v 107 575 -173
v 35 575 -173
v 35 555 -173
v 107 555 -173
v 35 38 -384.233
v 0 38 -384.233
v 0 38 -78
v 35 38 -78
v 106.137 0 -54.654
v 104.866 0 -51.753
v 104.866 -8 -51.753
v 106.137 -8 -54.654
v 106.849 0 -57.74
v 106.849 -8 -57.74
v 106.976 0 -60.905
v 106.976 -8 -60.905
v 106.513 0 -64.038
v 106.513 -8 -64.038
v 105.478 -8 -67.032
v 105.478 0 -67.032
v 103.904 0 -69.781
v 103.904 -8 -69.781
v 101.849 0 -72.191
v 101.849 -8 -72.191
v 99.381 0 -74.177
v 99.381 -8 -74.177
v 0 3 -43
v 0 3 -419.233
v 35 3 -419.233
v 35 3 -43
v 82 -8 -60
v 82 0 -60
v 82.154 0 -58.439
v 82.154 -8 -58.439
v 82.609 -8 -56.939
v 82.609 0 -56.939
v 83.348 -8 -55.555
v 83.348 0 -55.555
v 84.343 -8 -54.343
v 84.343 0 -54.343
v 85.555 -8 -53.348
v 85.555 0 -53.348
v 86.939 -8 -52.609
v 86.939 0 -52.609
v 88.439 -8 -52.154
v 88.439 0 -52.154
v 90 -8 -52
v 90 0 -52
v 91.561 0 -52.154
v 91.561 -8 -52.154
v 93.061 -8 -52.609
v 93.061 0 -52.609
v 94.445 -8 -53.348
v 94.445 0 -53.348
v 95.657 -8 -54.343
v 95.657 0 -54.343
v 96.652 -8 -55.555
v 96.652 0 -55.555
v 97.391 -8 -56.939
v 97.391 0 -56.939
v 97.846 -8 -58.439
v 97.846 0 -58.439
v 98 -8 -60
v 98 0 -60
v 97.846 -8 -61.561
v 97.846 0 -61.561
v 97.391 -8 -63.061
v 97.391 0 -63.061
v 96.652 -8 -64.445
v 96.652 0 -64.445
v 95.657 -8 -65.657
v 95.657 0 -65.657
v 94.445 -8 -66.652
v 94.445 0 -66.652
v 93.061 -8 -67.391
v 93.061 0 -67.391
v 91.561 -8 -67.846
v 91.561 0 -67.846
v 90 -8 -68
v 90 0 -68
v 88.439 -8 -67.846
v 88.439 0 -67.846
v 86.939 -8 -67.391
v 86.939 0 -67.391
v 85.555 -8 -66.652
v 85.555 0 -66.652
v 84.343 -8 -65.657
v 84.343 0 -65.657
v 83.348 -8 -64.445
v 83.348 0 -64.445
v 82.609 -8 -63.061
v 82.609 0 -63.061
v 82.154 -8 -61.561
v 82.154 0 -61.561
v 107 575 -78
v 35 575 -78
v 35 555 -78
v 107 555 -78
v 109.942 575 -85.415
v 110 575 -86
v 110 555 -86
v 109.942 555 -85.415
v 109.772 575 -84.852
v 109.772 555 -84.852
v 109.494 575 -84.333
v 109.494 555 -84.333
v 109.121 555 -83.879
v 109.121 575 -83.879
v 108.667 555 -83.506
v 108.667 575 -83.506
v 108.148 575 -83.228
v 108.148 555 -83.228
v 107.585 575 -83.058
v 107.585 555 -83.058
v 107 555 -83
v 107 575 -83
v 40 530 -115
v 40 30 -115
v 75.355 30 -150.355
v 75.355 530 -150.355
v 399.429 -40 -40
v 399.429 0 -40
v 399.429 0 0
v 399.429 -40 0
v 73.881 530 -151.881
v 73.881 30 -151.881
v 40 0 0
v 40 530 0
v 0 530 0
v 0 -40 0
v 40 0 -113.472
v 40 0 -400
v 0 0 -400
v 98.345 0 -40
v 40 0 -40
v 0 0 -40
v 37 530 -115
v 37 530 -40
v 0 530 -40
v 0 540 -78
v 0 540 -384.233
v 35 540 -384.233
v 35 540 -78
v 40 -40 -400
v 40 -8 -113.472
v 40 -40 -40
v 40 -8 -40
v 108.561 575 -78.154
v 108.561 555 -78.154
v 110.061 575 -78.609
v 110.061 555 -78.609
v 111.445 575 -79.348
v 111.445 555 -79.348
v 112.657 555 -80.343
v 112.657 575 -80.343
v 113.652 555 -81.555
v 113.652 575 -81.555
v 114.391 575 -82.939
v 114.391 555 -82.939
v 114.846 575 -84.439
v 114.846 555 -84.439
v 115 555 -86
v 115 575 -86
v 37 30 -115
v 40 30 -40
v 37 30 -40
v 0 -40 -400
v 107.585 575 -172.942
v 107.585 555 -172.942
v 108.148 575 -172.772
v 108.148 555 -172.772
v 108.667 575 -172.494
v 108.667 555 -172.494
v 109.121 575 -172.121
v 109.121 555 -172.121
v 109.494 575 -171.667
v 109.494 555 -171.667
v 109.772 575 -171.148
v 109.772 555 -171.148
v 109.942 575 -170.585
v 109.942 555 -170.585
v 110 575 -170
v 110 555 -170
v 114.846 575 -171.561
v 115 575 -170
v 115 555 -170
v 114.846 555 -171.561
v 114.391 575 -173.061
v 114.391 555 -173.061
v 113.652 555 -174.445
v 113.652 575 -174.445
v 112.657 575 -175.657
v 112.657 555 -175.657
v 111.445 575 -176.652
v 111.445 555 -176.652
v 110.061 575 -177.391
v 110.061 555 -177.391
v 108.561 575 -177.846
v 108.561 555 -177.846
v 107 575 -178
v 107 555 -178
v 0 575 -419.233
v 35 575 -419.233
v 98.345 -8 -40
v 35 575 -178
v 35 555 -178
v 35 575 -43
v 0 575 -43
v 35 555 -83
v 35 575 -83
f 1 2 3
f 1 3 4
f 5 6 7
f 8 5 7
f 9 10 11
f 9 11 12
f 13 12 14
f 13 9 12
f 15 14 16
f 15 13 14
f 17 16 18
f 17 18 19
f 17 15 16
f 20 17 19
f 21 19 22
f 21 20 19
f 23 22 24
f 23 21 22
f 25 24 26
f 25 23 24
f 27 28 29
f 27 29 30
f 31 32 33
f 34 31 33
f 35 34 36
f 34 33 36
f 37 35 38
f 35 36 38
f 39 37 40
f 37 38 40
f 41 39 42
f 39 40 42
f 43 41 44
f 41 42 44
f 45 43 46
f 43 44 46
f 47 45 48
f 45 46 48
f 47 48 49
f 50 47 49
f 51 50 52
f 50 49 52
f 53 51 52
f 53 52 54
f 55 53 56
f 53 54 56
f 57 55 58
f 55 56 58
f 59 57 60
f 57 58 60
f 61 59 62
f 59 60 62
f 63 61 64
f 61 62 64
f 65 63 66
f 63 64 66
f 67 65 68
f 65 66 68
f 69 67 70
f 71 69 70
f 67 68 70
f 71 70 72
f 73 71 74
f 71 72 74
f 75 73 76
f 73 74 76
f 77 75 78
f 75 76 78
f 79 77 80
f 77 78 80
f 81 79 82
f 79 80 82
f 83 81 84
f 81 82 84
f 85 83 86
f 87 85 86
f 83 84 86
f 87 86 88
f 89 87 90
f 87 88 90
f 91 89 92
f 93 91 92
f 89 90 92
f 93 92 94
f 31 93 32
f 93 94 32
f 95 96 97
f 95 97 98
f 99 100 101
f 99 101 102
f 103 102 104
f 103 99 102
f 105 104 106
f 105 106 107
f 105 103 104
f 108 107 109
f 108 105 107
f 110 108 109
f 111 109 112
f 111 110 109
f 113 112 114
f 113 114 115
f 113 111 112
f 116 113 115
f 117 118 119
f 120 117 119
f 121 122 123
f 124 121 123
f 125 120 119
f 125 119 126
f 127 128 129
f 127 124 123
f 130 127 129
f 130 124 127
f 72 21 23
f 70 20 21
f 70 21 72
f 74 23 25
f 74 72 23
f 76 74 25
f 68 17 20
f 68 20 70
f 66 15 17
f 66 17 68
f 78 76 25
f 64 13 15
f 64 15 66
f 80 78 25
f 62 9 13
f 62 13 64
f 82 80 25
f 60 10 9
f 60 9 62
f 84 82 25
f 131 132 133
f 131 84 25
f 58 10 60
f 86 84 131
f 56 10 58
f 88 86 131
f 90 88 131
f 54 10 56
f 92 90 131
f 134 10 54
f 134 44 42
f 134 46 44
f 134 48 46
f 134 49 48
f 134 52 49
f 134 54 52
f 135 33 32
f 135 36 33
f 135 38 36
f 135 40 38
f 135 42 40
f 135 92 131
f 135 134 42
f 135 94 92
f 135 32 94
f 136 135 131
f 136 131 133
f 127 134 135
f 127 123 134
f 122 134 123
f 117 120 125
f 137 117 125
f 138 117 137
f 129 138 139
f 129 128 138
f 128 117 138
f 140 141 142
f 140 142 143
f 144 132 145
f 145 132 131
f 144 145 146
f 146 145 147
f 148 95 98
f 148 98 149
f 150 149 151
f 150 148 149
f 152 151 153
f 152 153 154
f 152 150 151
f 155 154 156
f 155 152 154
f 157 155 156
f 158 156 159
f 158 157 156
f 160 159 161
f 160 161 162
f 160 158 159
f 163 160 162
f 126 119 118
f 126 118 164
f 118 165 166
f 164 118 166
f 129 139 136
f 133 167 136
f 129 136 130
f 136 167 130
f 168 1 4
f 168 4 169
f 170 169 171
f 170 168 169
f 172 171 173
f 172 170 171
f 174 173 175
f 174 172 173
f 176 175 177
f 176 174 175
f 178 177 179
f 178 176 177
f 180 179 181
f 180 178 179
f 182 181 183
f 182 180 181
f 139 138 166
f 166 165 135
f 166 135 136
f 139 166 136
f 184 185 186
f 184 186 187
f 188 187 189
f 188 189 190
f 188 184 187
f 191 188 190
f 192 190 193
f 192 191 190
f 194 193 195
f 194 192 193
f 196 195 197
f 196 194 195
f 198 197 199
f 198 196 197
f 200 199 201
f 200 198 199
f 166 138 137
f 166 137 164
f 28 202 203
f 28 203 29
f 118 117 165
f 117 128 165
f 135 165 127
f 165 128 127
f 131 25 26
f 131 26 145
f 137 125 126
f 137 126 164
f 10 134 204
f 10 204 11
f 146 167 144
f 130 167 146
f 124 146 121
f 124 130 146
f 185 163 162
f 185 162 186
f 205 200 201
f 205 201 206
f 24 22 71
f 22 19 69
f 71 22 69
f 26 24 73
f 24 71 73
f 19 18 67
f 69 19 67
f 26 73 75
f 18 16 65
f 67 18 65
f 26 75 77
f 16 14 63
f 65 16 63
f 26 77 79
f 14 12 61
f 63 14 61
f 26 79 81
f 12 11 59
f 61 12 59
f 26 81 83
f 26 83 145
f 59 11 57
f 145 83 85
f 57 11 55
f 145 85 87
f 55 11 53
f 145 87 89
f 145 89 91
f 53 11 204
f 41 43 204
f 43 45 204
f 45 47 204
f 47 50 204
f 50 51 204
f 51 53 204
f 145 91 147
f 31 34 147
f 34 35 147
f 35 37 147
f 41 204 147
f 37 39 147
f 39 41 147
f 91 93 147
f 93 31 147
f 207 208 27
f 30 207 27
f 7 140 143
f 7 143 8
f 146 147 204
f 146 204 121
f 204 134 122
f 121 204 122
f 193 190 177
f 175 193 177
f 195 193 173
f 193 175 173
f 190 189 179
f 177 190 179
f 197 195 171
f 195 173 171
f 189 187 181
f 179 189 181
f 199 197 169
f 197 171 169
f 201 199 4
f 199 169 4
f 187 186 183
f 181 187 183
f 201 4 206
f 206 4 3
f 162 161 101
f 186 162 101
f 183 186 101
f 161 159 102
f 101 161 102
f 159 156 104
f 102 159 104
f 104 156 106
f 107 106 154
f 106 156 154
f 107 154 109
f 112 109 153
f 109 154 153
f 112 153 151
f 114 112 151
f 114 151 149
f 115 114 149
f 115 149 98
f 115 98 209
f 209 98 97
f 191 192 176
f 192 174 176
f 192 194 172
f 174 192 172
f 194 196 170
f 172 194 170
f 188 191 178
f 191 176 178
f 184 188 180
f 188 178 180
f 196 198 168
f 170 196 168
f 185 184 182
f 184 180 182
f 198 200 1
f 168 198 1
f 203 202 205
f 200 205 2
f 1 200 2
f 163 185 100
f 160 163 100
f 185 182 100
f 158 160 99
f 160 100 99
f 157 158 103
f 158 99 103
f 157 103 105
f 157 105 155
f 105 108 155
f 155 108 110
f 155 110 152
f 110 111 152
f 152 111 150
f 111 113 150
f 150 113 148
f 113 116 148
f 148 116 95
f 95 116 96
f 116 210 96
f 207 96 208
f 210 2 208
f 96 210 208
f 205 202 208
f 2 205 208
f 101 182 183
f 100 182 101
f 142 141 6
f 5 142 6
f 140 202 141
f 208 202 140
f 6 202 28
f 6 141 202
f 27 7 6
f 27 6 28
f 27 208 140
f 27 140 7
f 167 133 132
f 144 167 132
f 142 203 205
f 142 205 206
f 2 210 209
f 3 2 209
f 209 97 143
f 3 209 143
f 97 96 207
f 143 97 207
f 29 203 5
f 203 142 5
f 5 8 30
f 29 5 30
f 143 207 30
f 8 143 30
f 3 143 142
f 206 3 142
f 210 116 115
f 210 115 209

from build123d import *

# Parameters (mm, degrees)
F1_DEPTH  = 40
F2_W      = 40
F2_H      = 40
F3_DEPTH  = 530
F4_R      = 8
F5_DEPTH  = 8
F6_W      = 3
F6_H      = 500
F7_DEPTH  = 75
F9_DEPTH  = 500
F10_W     = 572
F10_H     = 376.232696
F10_W_2   = 502
F10_H_2   = 306.232696
F11_DEPTH = 35
F13_DEPTH = 20


with BuildPart() as f1:
    # F0 (on Front) → F1 (new body)
    with BuildSketch(Plane.XZ):
        Polygon((0, 0), (0, -400), (40, -400), (40, -40), (399.429325, -40), (399.429325, 0), align=None)
    extrude(amount=F1_DEPTH)

    # F2 (on face) → F3 (join)
    with BuildSketch(Plane(origin=(0, 0, 0), x_dir=(-1, 0, 0), z_dir=(0, 1, 0))):
        with Locations((-20, -20)):
            Rectangle(F2_W, F2_H)
    extrude(amount=F3_DEPTH)

    # F4 (on face) → F5 (join)
    with BuildSketch(Plane(origin=(0, 0, 0), x_dir=(-1, 0, 0), z_dir=(0, 1, 0))):
        with BuildLine():
            Line((-98.345199, -40), (-104.86551, -51.752782))
            ThreePointArc((-104.86551, -51.752782), (-106.51335, -64.038474), (-99.381481, -74.177017))
            Line((-99.381481, -74.177017), (-40, -113.472042))
            Line((-40, -113.472042), (-40, -40))
            Line((-40, -40), (-98.345199, -40))
        make_face()
        with Locations((-90, -60)):
            Circle(F4_R, mode=Mode.SUBTRACT)
    extrude(amount=-F5_DEPTH)

    # F6 (on face) → F7 (join)
    with BuildSketch(Plane(origin=(0, 0, -40), x_dir=(1, 0, 0), z_dir=(0, 0, -1))):
        with Locations((38.5, -280)):
            Rectangle(F6_W, F6_H)
    extrude(amount=F7_DEPTH)

    # F8 (on face) → F9 (join, through all)
    with BuildSketch(Plane(origin=(0, 530, 0), x_dir=(-1, 0, 0), z_dir=(0, 1, 0))):
        Polygon((-37, -115), (-40, -115), (-75.355339, -150.355339), (-73.881064, -151.881064), align=None)
    extrude(amount=-F9_DEPTH)


with BuildPart() as f11:
    # F10 (on face) → F11 (new body)
    with BuildSketch(Plane(origin=(0, 0, 0), x_dir=(0, -1, 0), z_dir=(-1, 0, 0))):
        with Locations((-289, -231.116348)):
            Rectangle(F10_W, F10_H)
        with Locations((-289, -231.116348)):
            Rectangle(F10_W_2, F10_H_2, mode=Mode.SUBTRACT)
    extrude(amount=-F11_DEPTH)

    # F12 (on face) → F13 (join)
    with BuildSketch(Plane(origin=(0, 575, 0), x_dir=(-1, 0, 0), z_dir=(0, 1, 0))):
        with BuildLine():
            Line((-35, -83), (-35, -78))
            Line((-35, -78), (-107, -78))
            ThreePointArc((-107, -78), (-112.656854, -80.343146), (-115, -86))
            Line((-115, -86), (-115, -170))
            ThreePointArc((-115, -170), (-112.656854, -175.656854), (-107, -178))
            Line((-107, -178), (-35, -178))
            Line((-35, -178), (-35, -173))
            Line((-35, -173), (-107, -173))
            ThreePointArc((-107, -173), (-109.12132, -172.12132), (-110, -170))
            Line((-110, -170), (-110, -86))
            ThreePointArc((-110, -86), (-109.12132, -83.87868), (-107, -83))
            Line((-107, -83), (-35, -83))
        make_face()
    extrude(amount=-F13_DEPTH)


solid = Compound([f1.part, f11.part])
